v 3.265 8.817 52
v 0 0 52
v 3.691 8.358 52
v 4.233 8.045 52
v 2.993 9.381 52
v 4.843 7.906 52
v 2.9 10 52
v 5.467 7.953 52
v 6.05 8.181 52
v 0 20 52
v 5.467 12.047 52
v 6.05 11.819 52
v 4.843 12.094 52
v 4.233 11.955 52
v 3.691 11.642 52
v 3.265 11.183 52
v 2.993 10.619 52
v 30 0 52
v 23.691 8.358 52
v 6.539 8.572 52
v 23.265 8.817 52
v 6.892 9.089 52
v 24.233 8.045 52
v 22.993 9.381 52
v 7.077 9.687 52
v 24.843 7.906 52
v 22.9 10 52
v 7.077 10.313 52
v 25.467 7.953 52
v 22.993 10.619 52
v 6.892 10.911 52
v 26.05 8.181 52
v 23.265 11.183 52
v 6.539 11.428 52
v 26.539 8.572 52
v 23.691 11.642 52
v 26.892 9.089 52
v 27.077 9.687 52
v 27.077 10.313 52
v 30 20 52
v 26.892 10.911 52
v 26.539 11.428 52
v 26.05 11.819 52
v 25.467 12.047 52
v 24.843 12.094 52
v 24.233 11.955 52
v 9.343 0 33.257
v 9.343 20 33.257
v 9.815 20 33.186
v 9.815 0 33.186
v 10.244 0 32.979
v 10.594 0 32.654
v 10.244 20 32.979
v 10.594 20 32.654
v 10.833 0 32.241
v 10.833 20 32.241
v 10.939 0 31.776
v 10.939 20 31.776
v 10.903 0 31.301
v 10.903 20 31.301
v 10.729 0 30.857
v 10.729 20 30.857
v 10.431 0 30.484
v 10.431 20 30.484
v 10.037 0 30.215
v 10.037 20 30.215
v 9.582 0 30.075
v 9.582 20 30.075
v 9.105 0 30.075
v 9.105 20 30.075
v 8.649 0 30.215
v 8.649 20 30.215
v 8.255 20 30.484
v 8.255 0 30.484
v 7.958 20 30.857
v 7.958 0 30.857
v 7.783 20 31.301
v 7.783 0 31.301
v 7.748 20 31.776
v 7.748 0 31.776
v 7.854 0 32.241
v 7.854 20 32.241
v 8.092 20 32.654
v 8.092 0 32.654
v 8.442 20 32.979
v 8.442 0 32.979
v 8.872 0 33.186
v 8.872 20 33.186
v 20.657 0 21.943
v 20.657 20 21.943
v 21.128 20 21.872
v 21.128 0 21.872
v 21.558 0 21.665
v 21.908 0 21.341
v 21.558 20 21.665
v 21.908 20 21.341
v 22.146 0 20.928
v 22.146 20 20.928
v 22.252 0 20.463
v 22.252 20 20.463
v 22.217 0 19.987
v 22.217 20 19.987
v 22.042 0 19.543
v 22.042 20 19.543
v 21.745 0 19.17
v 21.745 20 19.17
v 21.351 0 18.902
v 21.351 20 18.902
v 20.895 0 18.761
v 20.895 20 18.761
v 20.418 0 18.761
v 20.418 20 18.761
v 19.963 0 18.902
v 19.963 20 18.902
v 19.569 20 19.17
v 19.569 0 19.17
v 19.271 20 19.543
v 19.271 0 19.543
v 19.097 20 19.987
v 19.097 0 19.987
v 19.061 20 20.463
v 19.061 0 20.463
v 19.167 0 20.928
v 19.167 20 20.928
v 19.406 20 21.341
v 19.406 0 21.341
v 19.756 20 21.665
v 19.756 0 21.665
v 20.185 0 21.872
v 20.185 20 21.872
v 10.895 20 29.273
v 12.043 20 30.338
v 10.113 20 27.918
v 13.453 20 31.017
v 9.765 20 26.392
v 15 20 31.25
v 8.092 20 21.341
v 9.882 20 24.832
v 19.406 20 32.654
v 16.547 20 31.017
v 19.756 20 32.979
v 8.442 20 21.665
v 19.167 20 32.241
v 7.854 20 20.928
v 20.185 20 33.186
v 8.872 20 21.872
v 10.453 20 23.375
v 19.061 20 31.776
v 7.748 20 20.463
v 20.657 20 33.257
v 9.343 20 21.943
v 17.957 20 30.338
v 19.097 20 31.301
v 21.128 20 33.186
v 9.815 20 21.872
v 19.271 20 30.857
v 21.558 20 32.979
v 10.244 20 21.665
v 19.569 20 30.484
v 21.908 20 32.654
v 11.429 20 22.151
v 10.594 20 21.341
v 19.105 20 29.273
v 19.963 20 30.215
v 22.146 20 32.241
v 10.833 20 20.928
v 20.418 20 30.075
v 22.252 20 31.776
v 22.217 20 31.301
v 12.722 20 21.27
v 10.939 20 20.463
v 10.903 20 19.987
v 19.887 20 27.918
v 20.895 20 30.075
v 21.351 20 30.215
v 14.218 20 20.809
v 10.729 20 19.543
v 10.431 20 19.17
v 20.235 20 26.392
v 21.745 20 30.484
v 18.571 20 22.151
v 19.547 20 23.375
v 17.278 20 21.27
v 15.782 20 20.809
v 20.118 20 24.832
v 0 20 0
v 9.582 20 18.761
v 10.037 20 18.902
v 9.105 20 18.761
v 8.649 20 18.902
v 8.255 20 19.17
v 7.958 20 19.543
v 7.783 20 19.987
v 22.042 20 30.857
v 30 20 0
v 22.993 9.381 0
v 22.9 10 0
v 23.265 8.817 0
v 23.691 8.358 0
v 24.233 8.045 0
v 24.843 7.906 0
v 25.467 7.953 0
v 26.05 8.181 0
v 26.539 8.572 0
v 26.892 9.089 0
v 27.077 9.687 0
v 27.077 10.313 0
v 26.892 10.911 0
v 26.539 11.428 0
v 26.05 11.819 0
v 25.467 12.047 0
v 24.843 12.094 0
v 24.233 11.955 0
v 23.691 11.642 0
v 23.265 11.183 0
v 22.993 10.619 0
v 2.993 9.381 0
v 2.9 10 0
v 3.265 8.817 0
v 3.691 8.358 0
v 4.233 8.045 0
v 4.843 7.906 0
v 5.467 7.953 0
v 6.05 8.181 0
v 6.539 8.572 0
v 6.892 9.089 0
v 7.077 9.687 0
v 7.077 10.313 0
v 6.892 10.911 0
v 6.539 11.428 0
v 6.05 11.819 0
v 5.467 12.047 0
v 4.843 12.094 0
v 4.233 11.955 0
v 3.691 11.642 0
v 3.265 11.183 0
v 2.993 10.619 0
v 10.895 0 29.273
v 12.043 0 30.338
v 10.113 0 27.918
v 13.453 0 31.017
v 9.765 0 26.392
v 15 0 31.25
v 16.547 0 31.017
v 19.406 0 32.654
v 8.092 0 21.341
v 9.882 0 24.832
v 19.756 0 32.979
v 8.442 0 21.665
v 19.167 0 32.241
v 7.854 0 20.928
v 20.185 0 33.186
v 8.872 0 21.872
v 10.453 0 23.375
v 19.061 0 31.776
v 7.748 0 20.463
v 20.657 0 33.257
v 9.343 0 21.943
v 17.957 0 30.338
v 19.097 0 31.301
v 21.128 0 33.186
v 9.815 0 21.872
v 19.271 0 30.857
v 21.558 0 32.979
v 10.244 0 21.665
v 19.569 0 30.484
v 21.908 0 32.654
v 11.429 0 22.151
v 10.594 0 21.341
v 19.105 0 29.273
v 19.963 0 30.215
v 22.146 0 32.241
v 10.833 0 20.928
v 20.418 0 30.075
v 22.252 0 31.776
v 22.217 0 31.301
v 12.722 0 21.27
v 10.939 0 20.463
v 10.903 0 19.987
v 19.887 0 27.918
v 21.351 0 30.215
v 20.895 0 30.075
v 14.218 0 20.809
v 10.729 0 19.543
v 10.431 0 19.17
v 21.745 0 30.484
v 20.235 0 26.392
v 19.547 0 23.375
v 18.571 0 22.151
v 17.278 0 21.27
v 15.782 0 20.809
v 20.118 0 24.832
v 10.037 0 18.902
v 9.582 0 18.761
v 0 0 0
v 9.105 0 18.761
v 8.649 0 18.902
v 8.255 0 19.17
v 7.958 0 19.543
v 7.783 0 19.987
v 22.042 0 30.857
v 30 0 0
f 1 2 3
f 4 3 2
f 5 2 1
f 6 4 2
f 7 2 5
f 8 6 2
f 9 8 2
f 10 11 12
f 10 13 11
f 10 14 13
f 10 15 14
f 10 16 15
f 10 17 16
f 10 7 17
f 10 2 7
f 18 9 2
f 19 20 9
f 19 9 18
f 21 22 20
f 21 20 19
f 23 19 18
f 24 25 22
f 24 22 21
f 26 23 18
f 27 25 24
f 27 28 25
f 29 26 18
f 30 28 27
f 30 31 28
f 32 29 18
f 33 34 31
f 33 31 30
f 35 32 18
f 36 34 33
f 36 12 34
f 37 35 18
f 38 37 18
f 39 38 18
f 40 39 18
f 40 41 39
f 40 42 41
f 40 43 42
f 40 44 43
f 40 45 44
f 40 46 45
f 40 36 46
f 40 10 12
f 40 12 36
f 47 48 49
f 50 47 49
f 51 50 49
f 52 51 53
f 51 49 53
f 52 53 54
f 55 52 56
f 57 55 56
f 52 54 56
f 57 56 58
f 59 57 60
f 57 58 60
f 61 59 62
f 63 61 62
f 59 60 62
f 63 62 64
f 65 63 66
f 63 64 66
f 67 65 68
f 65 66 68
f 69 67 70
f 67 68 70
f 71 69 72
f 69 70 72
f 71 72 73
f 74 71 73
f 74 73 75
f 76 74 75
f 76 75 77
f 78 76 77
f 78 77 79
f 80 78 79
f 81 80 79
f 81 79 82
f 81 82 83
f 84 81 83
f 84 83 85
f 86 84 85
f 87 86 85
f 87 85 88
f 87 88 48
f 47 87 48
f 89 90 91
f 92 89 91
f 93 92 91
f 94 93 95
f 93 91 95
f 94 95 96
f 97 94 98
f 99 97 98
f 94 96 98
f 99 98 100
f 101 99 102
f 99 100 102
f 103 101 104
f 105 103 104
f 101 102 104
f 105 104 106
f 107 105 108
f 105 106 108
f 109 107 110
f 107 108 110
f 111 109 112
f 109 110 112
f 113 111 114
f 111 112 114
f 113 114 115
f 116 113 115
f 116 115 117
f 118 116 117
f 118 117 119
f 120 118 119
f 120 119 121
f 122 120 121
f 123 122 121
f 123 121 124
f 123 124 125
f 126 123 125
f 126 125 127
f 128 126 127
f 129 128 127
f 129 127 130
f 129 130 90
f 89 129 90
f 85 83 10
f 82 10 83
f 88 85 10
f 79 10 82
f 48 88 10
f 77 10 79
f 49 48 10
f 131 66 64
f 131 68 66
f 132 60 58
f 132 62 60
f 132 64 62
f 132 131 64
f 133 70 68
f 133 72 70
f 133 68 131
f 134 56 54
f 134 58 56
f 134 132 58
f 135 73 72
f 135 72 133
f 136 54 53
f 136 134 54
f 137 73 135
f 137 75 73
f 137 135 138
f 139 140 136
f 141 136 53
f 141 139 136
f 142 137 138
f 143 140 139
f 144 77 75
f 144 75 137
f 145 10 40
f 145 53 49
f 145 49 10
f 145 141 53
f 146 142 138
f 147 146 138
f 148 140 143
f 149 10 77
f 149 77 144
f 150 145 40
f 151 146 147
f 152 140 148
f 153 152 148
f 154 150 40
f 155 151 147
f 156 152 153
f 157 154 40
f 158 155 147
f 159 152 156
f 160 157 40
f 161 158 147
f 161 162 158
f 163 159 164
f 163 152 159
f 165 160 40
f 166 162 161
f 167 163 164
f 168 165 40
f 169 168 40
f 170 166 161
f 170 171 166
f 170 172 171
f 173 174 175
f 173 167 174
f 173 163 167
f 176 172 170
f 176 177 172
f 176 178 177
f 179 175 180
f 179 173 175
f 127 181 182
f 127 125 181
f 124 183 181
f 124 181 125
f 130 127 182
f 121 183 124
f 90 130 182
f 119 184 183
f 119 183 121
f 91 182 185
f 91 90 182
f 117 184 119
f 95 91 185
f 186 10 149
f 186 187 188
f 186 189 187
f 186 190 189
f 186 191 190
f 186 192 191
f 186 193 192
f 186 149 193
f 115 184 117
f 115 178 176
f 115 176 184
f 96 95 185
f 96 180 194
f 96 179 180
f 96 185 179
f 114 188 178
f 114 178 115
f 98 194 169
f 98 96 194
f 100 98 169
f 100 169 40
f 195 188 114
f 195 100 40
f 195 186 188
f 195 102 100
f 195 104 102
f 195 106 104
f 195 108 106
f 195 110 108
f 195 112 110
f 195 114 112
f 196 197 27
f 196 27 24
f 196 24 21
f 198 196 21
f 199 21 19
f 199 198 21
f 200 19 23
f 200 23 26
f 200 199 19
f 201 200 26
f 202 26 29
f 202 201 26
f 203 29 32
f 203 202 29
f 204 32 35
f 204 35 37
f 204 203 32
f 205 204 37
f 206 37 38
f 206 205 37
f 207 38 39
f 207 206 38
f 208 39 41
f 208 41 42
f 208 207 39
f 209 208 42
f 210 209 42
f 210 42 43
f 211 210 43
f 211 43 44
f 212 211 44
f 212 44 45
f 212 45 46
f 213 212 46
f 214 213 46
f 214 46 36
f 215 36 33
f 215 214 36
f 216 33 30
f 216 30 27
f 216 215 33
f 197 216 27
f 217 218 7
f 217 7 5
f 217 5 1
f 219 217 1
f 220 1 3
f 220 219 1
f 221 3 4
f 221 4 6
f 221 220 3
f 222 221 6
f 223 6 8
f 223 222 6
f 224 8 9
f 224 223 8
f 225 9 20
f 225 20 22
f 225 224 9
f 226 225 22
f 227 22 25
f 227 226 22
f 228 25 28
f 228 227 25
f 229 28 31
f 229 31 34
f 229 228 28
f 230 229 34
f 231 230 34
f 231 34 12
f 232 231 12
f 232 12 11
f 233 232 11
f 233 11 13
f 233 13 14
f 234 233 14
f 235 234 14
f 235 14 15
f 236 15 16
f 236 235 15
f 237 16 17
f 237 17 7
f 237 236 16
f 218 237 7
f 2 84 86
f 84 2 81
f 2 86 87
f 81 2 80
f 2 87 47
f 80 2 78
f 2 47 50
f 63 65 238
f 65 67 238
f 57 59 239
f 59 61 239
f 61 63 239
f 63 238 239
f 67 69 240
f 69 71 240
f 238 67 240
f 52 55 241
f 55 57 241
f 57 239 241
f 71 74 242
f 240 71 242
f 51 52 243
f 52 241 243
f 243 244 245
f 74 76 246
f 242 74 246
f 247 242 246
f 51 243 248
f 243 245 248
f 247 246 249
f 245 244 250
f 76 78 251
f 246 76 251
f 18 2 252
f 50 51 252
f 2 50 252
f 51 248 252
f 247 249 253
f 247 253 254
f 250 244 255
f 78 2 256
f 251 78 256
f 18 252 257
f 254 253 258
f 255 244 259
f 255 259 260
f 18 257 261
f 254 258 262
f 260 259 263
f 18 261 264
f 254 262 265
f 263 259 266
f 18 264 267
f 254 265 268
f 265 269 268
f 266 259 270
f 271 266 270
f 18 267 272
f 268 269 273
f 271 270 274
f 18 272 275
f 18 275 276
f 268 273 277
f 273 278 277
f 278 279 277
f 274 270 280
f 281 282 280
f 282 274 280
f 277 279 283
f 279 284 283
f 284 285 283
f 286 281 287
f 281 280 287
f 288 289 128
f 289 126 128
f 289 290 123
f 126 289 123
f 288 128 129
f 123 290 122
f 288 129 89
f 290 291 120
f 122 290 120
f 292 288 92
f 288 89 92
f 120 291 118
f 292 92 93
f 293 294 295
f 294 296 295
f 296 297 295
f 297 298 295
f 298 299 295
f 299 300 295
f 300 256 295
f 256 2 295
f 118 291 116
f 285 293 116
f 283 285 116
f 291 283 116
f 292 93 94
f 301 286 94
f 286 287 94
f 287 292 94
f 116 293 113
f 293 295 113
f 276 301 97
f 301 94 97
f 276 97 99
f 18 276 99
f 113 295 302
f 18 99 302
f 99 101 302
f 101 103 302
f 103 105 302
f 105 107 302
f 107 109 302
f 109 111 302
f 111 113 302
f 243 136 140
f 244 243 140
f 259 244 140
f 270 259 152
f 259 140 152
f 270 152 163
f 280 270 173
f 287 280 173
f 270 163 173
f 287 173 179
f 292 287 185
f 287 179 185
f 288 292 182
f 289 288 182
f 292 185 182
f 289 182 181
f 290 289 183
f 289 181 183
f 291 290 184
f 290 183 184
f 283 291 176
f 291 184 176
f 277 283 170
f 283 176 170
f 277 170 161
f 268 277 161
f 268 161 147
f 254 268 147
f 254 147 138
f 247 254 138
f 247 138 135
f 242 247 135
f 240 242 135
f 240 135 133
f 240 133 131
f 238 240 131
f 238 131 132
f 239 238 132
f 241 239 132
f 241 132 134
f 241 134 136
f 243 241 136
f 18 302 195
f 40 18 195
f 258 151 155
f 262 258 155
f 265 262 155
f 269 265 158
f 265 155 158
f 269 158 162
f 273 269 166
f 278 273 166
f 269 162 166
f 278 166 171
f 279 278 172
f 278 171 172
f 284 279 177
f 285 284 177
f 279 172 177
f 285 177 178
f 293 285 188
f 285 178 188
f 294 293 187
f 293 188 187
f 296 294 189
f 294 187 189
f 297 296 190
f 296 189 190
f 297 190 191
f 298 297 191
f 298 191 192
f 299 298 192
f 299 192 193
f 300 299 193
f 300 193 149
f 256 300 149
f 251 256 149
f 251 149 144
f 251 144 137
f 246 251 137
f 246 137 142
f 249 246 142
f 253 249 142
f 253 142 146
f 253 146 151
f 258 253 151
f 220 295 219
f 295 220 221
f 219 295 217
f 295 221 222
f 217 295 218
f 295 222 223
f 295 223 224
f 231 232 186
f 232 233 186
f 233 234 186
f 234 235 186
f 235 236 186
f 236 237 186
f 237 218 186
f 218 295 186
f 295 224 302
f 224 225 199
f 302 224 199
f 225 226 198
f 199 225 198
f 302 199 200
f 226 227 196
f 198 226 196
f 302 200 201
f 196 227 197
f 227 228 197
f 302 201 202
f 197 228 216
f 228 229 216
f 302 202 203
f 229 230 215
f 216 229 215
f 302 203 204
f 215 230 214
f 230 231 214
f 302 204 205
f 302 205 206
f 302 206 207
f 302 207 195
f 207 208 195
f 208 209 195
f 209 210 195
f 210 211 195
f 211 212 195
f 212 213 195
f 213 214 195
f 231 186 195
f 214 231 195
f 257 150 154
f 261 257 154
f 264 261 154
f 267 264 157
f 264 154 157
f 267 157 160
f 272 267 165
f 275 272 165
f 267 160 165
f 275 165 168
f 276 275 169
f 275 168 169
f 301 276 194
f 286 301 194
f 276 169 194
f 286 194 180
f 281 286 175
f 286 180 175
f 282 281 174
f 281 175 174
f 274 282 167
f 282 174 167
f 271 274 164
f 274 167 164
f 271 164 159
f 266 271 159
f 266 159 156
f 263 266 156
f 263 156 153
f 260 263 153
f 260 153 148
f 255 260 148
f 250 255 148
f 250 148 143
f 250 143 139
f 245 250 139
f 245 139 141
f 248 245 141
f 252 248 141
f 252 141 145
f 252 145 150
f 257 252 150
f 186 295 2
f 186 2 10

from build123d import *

# Parameters (mm, degrees)
SKETCH_1_W          = 30
SKETCH_1_H          = 20
SKETCH_1_R          = 2.1
EXTRUDE_1_DEPTH     = 52
SKETCH_2_R          = 5.25
SKETCH_2_R_2        = 1.6
CUT_EXTRUDE_1_DEPTH = 64.277168078


with BuildPart() as part:
    # 草图1 → 凸台-拉伸1 (new body)
    with BuildSketch(Plane.XY):
        with Locations((15, 10)):
            Rectangle(SKETCH_1_W, SKETCH_1_H)
        with Locations(Location((5, 10, 0), (0, 0, 180))):
            Circle(SKETCH_1_R, mode=Mode.SUBTRACT)
        with Locations(Location((25, 10, 0), (0, 0, 180))):
            Circle(SKETCH_1_R, mode=Mode.SUBTRACT)
    extrude(amount=EXTRUDE_1_DEPTH)

    # 草图2 → 切除-拉伸1 (cut, through all)
    with BuildSketch(Plane(origin=(0, 20, 0), x_dir=(1, 0, 0), z_dir=(0, 1, 0))):
        with Locations(Location((15, -26, 0), (0, 0, 270))):
            Circle(SKETCH_2_R)
        with Locations(Location((9.343145751, -31.656854249, 0), (0, 0, 270))):
            Circle(SKETCH_2_R_2)
        with Locations(Location((9.343145751, -20.343145751, 0), (0, 0, 270))):
            Circle(SKETCH_2_R_2)
        with Locations(Location((20.656854249, -20.343145751, 0), (0, 0, 270))):
            Circle(SKETCH_2_R_2)
        with Locations(Location((20.656854249, -31.656854249, 0), (0, 0, 270))):
            Circle(SKETCH_2_R_2)
    extrude(amount=-CUT_EXTRUDE_1_DEPTH, mode=Mode.SUBTRACT)


solid = part.part
